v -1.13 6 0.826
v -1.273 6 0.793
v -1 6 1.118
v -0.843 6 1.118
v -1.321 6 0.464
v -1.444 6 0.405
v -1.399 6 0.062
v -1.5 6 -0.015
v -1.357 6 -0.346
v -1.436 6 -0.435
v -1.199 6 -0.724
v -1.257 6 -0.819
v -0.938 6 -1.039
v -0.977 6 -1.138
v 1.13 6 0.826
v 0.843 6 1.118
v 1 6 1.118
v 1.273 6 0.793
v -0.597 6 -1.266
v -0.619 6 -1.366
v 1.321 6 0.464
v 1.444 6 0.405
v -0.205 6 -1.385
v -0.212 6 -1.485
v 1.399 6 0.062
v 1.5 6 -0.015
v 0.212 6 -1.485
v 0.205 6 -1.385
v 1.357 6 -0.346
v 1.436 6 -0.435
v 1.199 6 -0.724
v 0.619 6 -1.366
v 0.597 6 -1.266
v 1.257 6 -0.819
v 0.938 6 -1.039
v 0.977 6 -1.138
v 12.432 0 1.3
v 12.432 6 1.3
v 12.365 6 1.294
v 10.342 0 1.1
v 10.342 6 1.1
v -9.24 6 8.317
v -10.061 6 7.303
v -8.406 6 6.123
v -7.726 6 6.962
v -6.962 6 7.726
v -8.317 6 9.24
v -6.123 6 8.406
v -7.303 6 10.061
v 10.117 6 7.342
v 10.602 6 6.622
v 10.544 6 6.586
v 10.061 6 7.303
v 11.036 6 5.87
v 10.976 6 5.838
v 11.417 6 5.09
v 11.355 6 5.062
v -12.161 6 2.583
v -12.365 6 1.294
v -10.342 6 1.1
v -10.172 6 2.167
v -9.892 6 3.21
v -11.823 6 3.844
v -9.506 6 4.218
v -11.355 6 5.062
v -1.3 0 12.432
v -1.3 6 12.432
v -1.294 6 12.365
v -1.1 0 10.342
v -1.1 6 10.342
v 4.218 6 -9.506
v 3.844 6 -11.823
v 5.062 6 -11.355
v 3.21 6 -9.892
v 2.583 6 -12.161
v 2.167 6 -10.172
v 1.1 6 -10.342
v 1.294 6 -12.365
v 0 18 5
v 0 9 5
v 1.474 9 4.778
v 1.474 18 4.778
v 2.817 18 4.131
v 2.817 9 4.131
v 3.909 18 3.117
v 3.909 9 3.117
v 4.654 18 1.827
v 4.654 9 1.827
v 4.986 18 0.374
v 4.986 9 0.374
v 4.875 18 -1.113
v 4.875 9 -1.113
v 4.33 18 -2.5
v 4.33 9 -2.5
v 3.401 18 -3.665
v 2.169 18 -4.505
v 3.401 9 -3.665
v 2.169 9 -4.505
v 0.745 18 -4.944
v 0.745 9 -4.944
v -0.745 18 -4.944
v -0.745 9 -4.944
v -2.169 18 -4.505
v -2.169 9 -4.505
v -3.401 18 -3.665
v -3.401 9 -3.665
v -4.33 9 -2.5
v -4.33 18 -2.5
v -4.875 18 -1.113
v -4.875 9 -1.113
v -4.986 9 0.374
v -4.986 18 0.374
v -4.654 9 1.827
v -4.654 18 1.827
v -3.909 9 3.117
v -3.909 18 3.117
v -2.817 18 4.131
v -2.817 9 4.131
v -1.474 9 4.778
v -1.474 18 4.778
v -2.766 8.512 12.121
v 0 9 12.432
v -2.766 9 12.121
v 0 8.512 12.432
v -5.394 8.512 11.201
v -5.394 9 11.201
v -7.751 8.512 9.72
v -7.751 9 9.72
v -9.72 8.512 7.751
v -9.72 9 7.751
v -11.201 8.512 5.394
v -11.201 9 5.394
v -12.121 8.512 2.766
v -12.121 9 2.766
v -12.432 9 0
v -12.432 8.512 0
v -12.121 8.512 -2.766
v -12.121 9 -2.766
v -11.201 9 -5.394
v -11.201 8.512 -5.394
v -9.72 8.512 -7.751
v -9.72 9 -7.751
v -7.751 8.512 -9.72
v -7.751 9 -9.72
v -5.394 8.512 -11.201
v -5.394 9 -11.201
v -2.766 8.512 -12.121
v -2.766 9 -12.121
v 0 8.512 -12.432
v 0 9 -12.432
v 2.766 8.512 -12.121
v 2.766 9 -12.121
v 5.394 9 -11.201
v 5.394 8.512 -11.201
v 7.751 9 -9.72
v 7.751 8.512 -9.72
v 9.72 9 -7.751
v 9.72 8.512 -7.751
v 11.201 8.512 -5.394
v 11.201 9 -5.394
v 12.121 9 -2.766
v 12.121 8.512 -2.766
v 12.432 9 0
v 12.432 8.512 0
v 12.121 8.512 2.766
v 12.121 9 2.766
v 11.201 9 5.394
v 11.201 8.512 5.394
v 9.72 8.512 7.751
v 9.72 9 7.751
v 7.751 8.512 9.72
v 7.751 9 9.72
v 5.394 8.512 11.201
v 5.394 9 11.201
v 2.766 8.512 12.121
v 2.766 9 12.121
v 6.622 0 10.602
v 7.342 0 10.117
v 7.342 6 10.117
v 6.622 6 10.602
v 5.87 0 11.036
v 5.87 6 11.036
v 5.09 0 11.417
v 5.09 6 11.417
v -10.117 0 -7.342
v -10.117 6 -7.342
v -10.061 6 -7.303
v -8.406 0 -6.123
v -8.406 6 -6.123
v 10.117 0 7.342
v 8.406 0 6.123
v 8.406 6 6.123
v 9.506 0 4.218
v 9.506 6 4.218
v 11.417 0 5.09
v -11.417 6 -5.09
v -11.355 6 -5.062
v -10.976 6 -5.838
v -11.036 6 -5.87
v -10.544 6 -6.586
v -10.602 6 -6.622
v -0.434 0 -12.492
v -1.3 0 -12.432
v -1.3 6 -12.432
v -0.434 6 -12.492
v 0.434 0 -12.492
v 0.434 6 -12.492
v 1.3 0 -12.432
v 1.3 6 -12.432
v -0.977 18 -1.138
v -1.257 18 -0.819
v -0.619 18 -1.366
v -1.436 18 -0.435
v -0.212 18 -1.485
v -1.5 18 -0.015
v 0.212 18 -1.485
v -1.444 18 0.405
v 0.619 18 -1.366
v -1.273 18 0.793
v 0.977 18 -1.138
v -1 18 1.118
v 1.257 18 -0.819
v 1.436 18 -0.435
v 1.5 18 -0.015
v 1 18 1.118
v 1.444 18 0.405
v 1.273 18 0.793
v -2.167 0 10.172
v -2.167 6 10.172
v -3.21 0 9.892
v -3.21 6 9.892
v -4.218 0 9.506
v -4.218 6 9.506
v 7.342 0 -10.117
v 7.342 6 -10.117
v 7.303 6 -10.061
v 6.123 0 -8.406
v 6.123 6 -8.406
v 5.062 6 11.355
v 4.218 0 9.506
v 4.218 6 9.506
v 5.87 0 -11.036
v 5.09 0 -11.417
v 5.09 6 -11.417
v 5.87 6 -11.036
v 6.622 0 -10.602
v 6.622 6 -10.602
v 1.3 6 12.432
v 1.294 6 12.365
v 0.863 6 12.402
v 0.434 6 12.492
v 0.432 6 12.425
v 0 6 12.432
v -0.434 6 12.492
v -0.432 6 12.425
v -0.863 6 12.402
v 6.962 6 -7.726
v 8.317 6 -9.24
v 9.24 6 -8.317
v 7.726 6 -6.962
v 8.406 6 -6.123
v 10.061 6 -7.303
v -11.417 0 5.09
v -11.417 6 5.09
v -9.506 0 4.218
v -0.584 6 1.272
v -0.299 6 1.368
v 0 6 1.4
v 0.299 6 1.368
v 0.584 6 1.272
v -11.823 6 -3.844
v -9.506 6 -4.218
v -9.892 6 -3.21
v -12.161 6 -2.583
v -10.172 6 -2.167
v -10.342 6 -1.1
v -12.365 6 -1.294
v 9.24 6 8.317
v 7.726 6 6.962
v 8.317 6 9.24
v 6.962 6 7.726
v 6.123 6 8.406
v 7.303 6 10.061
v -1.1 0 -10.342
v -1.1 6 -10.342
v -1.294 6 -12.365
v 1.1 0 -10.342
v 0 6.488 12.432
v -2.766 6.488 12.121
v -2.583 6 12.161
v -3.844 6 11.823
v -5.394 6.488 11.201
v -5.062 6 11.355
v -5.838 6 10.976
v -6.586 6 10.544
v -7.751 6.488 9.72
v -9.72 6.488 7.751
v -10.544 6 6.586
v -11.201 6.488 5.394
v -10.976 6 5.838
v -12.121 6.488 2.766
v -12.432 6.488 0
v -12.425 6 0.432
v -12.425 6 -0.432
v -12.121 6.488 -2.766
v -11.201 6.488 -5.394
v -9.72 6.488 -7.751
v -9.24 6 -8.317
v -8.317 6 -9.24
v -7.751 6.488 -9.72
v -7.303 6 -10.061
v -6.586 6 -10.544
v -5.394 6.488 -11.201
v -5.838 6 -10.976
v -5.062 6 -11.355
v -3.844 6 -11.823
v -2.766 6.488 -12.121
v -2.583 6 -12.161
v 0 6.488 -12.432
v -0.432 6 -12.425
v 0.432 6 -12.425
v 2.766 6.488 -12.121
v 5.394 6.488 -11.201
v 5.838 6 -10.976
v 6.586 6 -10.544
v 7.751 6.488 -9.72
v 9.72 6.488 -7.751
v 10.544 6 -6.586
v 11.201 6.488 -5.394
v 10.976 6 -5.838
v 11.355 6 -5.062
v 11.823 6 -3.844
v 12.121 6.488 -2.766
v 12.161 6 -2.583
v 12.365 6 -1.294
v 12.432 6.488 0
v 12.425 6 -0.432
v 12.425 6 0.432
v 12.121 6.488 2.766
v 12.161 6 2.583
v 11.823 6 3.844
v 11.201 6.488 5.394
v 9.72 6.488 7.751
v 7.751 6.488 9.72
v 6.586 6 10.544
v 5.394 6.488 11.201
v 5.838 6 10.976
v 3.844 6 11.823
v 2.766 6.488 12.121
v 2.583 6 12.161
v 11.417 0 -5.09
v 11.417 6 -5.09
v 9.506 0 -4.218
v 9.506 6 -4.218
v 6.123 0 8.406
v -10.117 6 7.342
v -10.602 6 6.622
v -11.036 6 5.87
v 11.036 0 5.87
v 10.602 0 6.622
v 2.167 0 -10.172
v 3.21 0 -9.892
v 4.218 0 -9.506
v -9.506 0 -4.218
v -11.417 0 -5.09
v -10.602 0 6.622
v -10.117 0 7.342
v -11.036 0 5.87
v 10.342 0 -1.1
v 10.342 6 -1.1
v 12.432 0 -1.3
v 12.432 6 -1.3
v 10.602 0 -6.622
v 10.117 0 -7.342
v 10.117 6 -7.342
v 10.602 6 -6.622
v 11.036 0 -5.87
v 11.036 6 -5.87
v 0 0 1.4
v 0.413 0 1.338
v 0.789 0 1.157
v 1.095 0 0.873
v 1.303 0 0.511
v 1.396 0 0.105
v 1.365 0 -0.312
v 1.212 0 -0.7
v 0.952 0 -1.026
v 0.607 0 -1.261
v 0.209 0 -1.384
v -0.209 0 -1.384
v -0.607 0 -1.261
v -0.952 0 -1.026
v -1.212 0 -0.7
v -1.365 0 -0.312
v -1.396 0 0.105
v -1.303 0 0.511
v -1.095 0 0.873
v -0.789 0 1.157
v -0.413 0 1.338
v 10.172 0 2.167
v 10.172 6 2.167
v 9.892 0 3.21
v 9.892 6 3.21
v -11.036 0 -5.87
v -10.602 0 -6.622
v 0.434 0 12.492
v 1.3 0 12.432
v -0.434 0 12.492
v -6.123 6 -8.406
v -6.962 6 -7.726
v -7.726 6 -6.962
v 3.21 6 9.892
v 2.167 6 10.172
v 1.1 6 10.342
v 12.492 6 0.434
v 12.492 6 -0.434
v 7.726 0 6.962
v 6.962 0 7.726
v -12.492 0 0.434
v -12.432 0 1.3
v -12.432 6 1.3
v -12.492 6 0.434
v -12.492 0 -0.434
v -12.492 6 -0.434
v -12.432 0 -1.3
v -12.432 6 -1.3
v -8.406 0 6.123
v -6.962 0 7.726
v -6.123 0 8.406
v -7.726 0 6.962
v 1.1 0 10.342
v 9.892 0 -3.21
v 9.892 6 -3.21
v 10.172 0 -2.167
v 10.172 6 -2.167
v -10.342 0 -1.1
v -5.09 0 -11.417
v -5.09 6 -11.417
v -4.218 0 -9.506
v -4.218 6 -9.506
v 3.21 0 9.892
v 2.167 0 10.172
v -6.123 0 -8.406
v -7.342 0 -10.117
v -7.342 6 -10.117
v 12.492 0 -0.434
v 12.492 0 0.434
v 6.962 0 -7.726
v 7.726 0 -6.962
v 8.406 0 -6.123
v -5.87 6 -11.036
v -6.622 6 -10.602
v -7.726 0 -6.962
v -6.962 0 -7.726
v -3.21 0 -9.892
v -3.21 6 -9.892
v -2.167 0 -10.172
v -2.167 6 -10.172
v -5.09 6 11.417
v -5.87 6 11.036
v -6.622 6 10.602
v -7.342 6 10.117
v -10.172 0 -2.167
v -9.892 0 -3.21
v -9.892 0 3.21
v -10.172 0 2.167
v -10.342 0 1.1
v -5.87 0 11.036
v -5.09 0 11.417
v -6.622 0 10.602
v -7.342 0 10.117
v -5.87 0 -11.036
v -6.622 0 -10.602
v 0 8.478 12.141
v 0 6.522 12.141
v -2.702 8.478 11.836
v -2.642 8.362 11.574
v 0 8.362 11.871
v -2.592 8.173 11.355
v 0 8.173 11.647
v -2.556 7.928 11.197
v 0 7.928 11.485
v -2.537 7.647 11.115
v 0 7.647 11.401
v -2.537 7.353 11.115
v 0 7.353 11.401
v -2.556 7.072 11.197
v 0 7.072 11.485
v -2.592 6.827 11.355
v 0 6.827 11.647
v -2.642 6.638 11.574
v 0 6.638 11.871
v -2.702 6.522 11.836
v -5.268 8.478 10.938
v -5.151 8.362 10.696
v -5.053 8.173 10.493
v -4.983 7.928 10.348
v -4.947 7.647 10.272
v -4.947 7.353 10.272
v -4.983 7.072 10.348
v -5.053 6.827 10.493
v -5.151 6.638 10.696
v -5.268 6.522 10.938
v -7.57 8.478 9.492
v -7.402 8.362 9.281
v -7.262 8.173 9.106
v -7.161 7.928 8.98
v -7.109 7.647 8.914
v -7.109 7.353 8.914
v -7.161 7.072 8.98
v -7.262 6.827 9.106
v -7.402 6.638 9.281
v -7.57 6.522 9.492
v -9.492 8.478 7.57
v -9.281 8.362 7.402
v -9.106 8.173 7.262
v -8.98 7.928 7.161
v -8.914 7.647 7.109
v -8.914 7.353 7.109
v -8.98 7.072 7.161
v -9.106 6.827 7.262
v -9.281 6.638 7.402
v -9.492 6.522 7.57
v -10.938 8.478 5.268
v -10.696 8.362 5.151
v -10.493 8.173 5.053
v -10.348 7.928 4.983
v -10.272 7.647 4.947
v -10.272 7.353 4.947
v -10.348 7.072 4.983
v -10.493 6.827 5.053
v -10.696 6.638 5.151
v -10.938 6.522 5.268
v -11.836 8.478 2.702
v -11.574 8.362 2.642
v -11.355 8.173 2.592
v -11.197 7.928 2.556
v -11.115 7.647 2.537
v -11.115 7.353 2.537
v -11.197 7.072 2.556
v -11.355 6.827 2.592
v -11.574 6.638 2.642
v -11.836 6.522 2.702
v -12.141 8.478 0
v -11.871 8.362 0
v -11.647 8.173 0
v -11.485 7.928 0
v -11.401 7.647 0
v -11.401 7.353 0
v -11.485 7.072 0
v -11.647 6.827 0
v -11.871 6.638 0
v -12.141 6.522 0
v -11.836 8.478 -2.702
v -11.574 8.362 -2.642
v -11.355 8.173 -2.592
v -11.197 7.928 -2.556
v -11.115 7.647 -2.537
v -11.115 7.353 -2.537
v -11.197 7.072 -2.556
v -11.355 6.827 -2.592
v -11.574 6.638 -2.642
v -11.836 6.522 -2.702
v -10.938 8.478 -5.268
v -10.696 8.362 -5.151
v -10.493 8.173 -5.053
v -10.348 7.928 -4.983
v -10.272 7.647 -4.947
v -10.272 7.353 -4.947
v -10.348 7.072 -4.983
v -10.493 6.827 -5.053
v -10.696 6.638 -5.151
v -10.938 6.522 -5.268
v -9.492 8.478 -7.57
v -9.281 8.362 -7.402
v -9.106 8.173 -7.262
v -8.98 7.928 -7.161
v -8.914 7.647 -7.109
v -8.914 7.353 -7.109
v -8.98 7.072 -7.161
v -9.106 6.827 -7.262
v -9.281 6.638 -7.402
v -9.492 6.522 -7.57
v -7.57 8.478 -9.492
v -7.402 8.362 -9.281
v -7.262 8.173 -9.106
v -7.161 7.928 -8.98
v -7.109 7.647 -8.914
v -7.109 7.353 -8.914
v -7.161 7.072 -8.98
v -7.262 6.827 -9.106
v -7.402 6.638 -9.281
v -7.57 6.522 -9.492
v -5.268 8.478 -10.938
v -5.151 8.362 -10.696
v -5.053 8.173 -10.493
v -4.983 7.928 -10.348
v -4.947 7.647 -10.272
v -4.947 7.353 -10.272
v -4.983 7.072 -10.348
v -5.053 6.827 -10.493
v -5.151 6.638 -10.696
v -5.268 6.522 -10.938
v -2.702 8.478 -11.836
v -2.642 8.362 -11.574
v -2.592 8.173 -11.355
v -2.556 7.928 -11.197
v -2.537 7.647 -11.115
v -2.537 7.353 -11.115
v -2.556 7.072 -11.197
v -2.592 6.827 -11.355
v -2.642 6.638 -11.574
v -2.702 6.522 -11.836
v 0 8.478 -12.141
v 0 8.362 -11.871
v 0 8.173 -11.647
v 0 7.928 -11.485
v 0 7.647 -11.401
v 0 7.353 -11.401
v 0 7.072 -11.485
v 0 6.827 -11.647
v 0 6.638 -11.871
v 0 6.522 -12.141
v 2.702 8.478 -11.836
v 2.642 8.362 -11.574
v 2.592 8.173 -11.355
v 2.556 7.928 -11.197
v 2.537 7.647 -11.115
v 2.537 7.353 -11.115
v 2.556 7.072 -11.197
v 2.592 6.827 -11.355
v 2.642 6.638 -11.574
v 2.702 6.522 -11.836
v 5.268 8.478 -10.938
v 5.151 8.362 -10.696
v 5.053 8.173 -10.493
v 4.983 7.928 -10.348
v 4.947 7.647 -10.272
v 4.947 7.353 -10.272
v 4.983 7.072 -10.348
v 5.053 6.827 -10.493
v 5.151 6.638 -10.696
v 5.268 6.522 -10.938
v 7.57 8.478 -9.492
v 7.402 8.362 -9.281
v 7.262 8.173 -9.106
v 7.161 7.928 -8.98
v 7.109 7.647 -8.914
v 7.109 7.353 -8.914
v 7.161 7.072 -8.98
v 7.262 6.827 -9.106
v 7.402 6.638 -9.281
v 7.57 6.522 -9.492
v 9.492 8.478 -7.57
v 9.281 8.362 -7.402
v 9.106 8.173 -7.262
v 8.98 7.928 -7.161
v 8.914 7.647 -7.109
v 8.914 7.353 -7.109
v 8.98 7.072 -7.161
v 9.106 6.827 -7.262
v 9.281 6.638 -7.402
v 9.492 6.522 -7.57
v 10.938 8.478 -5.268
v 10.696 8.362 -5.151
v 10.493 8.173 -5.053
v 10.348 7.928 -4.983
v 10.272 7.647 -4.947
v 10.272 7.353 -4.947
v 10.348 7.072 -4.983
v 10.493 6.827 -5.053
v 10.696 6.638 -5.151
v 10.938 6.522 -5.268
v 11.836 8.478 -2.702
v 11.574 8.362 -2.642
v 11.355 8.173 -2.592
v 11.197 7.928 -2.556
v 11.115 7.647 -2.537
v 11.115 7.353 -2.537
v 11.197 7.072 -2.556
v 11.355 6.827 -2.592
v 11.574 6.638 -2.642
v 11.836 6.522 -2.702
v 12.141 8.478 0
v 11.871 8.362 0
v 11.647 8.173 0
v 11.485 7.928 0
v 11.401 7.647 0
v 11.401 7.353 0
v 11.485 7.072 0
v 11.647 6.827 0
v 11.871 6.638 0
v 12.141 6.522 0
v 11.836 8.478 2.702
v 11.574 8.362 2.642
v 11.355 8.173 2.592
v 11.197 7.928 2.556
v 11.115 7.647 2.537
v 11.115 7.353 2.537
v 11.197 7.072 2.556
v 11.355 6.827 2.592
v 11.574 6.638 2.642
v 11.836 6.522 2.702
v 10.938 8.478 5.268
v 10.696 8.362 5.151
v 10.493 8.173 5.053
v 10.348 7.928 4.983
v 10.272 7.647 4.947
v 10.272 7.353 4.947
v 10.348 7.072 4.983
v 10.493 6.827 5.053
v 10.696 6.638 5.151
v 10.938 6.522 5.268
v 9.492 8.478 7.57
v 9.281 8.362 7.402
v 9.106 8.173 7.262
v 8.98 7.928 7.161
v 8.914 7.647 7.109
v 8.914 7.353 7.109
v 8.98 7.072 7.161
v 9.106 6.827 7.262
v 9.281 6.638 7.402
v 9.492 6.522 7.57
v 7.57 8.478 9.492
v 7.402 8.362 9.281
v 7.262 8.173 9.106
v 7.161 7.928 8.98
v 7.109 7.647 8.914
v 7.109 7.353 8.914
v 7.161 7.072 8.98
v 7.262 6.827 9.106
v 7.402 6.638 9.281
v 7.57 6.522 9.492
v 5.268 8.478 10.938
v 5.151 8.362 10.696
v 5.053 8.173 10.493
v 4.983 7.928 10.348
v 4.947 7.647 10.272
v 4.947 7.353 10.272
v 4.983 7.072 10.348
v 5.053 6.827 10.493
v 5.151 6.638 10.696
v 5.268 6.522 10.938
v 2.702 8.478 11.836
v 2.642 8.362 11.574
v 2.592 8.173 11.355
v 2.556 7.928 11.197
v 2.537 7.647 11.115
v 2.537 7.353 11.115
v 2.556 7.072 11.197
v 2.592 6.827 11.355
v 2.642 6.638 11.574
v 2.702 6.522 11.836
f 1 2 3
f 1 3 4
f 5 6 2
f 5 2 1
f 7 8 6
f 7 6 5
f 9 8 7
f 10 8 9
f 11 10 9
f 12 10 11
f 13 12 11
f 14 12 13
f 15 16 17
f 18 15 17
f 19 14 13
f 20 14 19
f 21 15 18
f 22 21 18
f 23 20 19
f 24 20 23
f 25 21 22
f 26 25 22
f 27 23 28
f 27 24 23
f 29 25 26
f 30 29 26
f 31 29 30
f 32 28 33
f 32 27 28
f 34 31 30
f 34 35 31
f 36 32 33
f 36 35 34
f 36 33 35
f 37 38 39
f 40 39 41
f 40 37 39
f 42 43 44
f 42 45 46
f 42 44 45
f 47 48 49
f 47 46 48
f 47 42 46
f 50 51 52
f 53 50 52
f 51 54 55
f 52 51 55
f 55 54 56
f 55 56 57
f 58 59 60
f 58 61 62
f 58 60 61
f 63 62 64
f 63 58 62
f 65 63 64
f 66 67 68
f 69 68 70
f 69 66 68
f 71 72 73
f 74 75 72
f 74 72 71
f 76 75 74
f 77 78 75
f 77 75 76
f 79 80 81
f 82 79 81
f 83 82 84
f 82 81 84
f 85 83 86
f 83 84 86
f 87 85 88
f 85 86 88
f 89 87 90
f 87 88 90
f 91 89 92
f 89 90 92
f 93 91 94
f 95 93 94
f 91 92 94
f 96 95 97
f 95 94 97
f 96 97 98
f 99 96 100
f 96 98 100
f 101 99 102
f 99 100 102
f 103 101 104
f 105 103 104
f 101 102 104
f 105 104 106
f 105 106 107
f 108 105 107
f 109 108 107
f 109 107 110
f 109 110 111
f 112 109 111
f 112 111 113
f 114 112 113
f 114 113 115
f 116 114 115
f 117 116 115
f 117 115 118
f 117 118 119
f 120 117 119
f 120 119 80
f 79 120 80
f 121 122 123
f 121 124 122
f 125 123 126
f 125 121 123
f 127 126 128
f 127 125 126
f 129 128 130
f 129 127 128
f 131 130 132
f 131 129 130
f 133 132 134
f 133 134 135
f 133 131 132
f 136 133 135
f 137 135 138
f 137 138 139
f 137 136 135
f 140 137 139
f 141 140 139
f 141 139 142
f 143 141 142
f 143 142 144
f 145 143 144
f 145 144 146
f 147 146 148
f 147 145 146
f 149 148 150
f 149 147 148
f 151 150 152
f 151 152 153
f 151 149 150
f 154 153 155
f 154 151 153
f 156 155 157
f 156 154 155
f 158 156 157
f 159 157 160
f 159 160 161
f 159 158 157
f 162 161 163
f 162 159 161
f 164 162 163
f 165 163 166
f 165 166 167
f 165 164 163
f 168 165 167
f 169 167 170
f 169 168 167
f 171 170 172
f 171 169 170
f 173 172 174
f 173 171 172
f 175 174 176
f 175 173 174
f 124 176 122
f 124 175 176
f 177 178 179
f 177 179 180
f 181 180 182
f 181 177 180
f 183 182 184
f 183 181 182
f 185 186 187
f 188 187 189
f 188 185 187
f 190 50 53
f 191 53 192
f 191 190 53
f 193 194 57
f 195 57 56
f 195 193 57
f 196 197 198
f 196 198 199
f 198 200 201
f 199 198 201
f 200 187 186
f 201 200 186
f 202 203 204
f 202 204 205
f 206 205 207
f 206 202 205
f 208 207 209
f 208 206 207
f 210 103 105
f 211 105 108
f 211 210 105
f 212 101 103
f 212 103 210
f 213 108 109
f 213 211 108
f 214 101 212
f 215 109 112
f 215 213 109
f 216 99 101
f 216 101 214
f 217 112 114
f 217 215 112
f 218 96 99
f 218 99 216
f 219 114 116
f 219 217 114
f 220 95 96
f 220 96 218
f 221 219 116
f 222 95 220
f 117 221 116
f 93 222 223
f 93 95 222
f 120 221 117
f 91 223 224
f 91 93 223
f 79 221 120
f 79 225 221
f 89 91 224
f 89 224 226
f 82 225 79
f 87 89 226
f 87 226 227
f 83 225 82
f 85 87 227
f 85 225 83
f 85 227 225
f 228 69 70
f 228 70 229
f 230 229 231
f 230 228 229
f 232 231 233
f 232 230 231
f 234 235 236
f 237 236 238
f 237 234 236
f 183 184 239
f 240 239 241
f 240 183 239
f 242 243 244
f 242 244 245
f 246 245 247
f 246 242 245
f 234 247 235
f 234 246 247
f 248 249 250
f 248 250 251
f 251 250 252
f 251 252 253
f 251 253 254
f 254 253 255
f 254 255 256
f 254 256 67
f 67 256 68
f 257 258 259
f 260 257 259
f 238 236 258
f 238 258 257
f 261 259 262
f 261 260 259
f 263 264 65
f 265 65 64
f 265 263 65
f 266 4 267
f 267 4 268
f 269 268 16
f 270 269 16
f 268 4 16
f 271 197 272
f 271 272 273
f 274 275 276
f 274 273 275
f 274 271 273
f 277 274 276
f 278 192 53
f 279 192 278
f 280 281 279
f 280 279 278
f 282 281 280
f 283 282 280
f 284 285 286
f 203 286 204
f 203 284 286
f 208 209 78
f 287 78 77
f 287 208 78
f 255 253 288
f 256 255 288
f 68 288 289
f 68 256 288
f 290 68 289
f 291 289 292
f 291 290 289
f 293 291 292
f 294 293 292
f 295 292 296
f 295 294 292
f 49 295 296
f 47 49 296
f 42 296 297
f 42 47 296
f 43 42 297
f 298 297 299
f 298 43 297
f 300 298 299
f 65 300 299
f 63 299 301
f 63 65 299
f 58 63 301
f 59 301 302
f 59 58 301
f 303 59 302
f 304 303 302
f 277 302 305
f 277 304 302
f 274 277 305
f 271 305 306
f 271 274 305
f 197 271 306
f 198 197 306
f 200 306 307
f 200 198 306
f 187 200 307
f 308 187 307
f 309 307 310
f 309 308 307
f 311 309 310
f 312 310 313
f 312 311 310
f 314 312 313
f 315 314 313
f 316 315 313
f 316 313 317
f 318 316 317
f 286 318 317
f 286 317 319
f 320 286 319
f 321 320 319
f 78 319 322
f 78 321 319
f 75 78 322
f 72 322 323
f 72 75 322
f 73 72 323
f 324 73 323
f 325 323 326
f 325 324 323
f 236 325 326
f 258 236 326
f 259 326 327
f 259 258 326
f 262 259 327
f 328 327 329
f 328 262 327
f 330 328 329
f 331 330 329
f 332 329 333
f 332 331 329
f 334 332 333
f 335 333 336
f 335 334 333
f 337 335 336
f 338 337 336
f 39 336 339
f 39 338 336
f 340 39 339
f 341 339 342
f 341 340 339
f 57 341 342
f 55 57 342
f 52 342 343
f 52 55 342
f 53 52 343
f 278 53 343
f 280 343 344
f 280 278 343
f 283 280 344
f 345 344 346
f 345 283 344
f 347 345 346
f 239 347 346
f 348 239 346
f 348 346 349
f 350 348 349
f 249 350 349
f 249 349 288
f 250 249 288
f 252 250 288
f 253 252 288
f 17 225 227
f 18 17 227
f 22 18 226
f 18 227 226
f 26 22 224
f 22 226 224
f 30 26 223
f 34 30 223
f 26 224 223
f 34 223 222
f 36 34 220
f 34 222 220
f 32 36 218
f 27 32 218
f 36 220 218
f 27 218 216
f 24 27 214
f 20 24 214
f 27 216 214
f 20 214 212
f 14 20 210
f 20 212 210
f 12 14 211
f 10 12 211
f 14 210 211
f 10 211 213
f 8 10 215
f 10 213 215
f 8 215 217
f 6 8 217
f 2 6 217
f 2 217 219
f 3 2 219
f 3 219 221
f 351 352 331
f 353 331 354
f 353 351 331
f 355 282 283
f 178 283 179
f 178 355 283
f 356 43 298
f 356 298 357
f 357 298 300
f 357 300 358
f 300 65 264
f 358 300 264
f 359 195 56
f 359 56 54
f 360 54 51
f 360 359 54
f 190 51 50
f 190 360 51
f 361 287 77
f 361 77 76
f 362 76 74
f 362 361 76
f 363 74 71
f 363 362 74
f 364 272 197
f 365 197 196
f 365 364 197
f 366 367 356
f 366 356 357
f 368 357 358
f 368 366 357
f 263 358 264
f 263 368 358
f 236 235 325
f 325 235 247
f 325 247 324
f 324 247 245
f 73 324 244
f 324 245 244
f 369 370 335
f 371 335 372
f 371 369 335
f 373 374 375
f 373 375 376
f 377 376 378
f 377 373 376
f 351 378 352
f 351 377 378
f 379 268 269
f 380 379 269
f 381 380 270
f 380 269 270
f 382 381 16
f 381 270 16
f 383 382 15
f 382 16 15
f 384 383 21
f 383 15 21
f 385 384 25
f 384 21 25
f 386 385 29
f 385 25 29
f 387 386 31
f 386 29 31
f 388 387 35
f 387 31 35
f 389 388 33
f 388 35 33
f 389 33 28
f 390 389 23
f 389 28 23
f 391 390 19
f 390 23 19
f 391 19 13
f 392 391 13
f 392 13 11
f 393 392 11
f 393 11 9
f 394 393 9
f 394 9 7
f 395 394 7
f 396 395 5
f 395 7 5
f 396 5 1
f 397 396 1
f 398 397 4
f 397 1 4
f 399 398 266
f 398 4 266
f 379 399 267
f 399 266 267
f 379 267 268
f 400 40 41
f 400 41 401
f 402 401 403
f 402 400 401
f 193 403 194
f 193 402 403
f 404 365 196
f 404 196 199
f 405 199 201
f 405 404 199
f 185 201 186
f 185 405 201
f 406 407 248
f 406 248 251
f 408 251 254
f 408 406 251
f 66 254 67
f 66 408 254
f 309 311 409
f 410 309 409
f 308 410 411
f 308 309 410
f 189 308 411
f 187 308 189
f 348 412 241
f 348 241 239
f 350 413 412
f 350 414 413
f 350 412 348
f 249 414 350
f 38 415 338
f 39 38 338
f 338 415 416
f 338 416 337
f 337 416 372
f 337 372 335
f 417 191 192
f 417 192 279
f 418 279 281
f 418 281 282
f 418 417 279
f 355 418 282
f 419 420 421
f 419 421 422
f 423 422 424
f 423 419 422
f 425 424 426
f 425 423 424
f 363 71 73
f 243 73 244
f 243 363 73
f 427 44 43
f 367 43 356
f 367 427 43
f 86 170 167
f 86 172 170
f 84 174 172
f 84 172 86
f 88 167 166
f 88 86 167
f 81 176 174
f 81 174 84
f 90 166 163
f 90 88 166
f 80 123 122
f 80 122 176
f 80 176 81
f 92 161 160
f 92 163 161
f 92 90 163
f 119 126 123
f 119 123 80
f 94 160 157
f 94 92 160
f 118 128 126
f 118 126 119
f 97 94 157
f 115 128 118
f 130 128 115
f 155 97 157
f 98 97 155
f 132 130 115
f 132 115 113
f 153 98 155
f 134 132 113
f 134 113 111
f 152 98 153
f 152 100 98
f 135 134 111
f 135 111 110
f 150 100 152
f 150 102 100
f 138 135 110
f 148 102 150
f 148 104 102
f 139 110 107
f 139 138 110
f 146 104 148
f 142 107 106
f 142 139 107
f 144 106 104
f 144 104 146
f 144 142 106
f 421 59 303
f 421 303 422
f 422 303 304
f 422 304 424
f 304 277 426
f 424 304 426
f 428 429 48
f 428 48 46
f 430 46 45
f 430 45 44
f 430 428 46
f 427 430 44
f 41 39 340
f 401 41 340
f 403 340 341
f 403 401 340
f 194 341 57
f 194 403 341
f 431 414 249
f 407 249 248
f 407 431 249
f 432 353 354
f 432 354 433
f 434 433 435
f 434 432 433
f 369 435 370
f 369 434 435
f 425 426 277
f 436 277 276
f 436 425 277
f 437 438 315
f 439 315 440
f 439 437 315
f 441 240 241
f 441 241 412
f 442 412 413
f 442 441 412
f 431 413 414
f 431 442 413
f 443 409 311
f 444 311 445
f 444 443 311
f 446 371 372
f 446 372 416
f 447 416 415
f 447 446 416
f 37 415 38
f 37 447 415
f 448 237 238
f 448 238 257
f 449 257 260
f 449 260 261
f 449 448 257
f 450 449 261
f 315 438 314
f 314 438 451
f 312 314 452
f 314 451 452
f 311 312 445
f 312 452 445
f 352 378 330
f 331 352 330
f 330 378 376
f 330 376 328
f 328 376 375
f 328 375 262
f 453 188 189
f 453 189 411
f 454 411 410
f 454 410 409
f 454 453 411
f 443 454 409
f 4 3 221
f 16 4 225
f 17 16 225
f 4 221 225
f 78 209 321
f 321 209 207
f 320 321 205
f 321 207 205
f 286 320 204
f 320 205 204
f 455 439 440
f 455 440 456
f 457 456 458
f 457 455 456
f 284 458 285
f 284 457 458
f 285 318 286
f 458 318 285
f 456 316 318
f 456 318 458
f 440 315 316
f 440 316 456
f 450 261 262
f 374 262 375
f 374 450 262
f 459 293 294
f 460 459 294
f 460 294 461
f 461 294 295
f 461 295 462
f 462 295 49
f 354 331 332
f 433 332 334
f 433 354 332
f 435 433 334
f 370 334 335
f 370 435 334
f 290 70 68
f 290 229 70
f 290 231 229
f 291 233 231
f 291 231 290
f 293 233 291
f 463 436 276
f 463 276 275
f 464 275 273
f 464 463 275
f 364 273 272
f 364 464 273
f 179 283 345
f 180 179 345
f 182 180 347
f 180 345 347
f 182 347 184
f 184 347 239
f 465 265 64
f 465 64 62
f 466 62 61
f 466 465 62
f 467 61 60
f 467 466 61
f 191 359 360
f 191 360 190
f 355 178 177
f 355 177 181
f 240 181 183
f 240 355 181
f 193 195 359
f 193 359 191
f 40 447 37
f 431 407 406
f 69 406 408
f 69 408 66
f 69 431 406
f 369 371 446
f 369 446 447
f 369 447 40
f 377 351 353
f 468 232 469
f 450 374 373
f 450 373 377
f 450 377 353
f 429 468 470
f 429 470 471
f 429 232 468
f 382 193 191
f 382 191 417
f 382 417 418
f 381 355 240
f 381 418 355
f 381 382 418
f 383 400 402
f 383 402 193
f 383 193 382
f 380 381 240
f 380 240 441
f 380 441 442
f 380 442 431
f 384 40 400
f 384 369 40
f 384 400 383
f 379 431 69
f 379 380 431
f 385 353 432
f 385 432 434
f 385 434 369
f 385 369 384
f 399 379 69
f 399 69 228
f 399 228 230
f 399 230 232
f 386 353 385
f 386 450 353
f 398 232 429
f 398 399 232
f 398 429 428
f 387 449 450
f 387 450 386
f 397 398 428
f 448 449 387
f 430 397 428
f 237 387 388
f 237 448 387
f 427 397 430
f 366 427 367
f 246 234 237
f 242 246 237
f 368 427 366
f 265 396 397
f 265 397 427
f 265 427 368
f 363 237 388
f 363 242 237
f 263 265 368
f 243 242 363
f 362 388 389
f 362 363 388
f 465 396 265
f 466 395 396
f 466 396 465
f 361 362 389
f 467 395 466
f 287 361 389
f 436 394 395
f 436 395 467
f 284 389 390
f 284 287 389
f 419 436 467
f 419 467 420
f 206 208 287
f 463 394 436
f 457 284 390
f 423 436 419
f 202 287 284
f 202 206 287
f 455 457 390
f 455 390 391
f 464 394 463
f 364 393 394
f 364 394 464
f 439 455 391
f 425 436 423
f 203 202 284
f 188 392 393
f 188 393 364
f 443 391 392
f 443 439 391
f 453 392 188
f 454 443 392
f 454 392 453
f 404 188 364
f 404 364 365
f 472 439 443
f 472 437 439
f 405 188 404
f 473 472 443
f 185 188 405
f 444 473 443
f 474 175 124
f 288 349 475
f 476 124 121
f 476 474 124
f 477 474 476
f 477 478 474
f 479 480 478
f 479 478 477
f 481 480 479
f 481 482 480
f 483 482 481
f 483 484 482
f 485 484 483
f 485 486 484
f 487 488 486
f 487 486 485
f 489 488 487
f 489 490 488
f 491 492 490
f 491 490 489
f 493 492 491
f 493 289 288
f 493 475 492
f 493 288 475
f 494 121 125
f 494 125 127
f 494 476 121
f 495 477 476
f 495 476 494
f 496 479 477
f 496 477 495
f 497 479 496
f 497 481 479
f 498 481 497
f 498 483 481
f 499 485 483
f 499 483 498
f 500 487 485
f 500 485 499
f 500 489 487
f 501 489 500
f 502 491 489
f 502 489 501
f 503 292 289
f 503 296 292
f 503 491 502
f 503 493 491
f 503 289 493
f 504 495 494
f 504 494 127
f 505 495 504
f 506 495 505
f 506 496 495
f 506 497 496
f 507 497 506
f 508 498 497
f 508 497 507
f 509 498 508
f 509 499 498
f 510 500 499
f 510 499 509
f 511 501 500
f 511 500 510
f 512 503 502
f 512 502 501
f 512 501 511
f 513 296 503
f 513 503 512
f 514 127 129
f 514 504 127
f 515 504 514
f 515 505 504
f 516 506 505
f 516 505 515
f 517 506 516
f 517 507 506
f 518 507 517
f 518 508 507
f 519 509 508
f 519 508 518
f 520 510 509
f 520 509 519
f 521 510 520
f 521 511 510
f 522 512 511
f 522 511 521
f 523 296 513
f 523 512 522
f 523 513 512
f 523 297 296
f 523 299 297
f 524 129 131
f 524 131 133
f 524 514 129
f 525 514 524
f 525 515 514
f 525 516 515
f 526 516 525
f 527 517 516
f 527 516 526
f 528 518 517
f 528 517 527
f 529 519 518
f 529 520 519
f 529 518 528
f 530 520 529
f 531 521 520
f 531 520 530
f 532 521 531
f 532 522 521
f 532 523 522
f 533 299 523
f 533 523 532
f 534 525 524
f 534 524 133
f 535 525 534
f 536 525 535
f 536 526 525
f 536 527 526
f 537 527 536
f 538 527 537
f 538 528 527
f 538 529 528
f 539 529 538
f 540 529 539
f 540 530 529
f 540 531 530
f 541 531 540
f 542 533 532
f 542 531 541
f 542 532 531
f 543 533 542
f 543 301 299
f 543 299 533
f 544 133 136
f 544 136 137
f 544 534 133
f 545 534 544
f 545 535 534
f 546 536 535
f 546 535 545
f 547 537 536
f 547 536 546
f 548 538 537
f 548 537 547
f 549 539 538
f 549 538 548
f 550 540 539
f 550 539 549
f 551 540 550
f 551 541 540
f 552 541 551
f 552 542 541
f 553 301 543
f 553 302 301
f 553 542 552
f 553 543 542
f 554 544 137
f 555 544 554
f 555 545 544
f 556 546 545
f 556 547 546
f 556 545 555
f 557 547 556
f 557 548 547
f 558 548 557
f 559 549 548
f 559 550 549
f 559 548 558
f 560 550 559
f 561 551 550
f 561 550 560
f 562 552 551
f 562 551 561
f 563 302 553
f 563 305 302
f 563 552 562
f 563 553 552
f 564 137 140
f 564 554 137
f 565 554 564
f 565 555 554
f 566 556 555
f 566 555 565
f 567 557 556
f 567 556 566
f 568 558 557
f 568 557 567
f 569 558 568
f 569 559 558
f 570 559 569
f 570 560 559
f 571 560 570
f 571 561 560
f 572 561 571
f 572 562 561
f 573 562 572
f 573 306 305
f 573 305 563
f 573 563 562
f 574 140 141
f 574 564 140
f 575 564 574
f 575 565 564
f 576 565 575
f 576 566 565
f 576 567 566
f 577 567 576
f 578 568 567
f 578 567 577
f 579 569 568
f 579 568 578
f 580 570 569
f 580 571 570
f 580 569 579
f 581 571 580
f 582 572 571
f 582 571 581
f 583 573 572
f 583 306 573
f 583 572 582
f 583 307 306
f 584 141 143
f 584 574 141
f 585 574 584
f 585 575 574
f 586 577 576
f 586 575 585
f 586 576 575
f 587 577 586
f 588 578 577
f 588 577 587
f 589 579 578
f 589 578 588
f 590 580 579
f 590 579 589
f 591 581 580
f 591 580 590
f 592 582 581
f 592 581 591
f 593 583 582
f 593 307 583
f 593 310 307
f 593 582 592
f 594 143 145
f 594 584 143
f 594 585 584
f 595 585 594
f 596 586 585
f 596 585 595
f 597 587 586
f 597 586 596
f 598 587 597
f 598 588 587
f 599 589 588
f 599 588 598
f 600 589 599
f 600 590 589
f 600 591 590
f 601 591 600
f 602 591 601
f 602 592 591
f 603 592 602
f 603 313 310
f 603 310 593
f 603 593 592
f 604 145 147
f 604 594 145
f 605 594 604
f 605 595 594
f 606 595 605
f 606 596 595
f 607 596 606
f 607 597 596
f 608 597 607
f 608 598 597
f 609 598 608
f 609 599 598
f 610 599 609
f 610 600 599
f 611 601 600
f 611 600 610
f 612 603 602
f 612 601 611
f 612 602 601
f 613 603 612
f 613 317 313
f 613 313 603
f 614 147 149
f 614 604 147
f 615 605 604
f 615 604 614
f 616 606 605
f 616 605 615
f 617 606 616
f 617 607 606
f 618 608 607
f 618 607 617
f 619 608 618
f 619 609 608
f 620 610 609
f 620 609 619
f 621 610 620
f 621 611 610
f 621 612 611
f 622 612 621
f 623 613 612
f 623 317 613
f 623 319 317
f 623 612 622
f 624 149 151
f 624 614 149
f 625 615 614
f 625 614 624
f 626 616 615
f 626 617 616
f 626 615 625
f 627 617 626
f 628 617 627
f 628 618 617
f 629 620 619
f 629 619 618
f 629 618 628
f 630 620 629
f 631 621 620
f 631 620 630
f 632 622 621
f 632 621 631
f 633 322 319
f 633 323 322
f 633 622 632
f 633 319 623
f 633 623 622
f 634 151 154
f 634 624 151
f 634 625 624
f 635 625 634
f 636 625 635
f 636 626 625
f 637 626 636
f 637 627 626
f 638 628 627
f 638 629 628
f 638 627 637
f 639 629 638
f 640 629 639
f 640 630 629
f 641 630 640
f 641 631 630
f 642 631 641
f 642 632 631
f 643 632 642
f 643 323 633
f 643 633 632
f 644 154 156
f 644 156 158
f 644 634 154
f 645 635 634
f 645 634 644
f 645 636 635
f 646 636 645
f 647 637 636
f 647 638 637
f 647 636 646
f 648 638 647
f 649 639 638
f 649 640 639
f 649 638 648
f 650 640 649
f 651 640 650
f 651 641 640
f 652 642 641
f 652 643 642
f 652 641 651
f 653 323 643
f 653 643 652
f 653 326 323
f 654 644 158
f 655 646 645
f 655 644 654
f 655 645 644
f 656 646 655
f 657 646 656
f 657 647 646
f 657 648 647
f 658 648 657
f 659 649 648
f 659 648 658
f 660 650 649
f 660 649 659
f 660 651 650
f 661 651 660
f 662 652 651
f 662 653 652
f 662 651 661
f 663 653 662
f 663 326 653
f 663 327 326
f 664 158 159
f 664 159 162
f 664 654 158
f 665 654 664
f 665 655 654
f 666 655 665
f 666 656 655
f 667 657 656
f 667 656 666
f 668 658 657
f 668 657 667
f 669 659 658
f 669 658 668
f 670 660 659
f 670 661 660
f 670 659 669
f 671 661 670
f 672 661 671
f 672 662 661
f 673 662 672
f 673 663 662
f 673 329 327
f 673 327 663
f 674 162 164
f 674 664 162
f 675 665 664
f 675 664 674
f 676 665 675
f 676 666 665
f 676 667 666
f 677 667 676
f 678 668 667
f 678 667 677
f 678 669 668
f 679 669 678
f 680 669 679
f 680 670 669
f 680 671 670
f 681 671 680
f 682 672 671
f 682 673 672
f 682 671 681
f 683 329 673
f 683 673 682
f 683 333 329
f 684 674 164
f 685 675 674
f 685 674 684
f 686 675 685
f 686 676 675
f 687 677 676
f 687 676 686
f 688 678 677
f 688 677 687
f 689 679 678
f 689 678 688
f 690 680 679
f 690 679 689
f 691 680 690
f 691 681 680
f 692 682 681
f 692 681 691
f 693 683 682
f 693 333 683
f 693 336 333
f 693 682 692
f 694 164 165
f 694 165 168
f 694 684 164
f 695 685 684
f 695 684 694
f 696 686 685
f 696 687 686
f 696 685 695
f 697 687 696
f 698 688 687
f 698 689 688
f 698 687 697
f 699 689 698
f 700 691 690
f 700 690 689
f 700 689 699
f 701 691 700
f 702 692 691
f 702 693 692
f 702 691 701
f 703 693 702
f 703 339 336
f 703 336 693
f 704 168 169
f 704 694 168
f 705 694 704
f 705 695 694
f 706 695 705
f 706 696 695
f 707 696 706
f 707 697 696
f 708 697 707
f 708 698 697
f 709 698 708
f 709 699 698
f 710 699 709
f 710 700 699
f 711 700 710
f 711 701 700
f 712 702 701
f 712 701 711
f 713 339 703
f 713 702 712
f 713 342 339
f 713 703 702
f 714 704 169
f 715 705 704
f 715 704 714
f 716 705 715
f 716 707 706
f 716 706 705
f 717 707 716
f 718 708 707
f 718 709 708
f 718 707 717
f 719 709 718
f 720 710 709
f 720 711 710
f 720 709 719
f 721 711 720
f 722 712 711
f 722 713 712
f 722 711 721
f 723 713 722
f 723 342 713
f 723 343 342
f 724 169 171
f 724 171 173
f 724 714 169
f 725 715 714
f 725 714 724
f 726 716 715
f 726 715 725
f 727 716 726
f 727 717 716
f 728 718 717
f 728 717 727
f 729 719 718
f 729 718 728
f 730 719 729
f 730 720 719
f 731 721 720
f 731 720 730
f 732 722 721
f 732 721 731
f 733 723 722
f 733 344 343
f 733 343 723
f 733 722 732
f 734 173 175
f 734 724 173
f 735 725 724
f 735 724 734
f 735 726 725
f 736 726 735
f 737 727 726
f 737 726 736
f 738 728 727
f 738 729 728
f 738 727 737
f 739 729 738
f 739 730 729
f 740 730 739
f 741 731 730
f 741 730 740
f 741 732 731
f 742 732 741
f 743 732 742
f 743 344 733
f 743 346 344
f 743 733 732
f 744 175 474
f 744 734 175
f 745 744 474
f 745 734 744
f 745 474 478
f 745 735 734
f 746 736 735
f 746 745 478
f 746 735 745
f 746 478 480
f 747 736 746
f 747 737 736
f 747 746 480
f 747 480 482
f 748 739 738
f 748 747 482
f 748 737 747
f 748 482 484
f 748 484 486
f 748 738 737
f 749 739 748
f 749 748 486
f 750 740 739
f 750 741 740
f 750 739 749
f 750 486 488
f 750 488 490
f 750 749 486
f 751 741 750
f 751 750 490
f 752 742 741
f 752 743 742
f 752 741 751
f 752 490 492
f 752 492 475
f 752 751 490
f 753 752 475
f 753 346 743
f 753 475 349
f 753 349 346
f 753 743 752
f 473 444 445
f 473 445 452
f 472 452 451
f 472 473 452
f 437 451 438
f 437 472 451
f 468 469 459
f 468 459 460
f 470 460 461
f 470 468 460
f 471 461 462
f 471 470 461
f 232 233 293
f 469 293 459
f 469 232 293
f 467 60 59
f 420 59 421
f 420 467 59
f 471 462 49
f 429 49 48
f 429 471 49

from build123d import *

# Parameters (mm, degrees)
EXTRUDE_1_DEPTH     = 6
SKETCH_3_R          = 1.4
CUT_EXTRUDE_1_DEPTH = 6
SKETCH_4_R          = 5
EXTRUDE_2_DEPTH     = 12
CUT_EXTRUDE_2_DEPTH = 12


with BuildPart() as part:
    # 草图2 → 凸台-拉伸1 (new body)
    with BuildSketch(Plane(origin=(0, 0, 0), x_dir=(1, 0, 0), z_dir=(0, 1, 0))):
        with BuildLine():
            Line((-1.1, 10.341663309), (-1.3, 12.432216214))
            ThreePointArc((-1.3, 12.432216214), (0, 12.5), (1.3, 12.432216214))
            Line((1.3, 12.432216214), (1.1, 10.341663309))
            ThreePointArc((1.1, 10.341663309), (2.691718069, 10.045628593), (4.21820371, 9.506143143))
            Line((4.21820371, 9.506143143), (5.090275082, 11.416615067))
            ThreePointArc((5.090275082, 11.416615067), (6.25, 10.825317547), (7.341941132, 10.116615067))
            Line((7.341941132, 10.116615067), (6.123459599, 8.406143143))
            ThreePointArc((6.123459599, 8.406143143), (7.353910524, 7.353910524), (8.406143143, 6.123459599))
            Line((8.406143143, 6.123459599), (10.116615067, 7.341941132))
            ThreePointArc((10.116615067, 7.341941132), (10.825317547, 6.25), (11.416615067, 5.090275082))
            Line((11.416615067, 5.090275082), (9.506143143, 4.21820371))
            ThreePointArc((9.506143143, 4.21820371), (10.045628593, 2.691718069), (10.341663309, 1.1))
            Line((10.341663309, 1.1), (12.432216214, 1.3))
            ThreePointArc((12.432216214, 1.3), (12.5, 0), (12.432216214, -1.3))
            Line((12.432216214, -1.3), (10.341663309, -1.1))
            ThreePointArc((10.341663309, -1.1), (10.045628593, -2.691718069), (9.506143143, -4.21820371))
            Line((9.506143143, -4.21820371), (11.416615067, -5.090275082))
            ThreePointArc((11.416615067, -5.090275082), (10.825317547, -6.25), (10.116615067, -7.341941132))
            Line((10.116615067, -7.341941132), (8.406143143, -6.123459599))
            ThreePointArc((8.406143143, -6.123459599), (7.353910524, -7.353910524), (6.123459599, -8.406143143))
            Line((6.123459599, -8.406143143), (7.341941132, -10.116615067))
            ThreePointArc((7.341941132, -10.116615067), (6.25, -10.825317547), (5.090275082, -11.416615067))
            Line((5.090275082, -11.416615067), (4.21820371, -9.506143143))
            ThreePointArc((4.21820371, -9.506143143), (2.691718069, -10.045628593), (1.1, -10.341663309))
            Line((1.1, -10.341663309), (1.3, -12.432216214))
            ThreePointArc((1.3, -12.432216214), (0, -12.5), (-1.3, -12.432216214))
            Line((-1.3, -12.432216214), (-1.1, -10.341663309))
            ThreePointArc((-1.1, -10.341663309), (-2.691718069, -10.045628593), (-4.21820371, -9.506143143))
            Line((-4.21820371, -9.506143143), (-5.090275082, -11.416615067))
            ThreePointArc((-5.090275082, -11.416615067), (-6.25, -10.825317547), (-7.341941132, -10.116615067))
            Line((-7.341941132, -10.116615067), (-6.123459599, -8.406143143))
            ThreePointArc((-6.123459599, -8.406143143), (-7.353910524, -7.353910524), (-8.406143143, -6.123459599))
            Line((-8.406143143, -6.123459599), (-10.116615067, -7.341941132))
            ThreePointArc((-10.116615067, -7.341941132), (-10.825317547, -6.25), (-11.416615067, -5.090275082))
            Line((-11.416615067, -5.090275082), (-9.506143143, -4.21820371))
            ThreePointArc((-9.506143143, -4.21820371), (-10.045628593, -2.691718069), (-10.341663309, -1.1))
            Line((-10.341663309, -1.1), (-12.432216214, -1.3))
            ThreePointArc((-12.432216214, -1.3), (-12.5, 0), (-12.432216214, 1.3))
            Line((-12.432216214, 1.3), (-10.341663309, 1.1))
            ThreePointArc((-10.341663309, 1.1), (-10.045628593, 2.691718069), (-9.506143143, 4.21820371))
            Line((-9.506143143, 4.21820371), (-11.416615067, 5.090275082))
            ThreePointArc((-11.416615067, 5.090275082), (-10.825317547, 6.25), (-10.116615067, 7.341941132))
            Line((-10.116615067, 7.341941132), (-8.406143143, 6.123459599))
            ThreePointArc((-8.406143143, 6.123459599), (-7.353910524, 7.353910524), (-6.123459599, 8.406143143))
            Line((-6.123459599, 8.406143143), (-7.341941132, 10.116615067))
            ThreePointArc((-7.341941132, 10.116615067), (-6.25, 10.825317547), (-5.090275082, 11.416615067))
            Line((-5.090275082, 11.416615067), (-4.21820371, 9.506143143))
            ThreePointArc((-4.21820371, 9.506143143), (-2.691718069, 10.045628593), (-1.1, 10.341663309))
        make_face()
    extrude(amount=EXTRUDE_1_DEPTH)

    # 草图3 → 切除-拉伸1 (cut)
    with BuildSketch(Plane(origin=(0, 6, 0), x_dir=(1, 0, 0), z_dir=(0, 1, 0))):
        with Locations(Location((0, 0, 0), (0, 0, 270))):
            Circle(SKETCH_3_R)
    extrude(amount=-CUT_EXTRUDE_1_DEPTH, mode=Mode.SUBTRACT)

    # 草图4 → 凸台-拉伸2 (add)
    with BuildSketch(Plane(origin=(0, 6, 0), x_dir=(1, 0, 0), z_dir=(0, 1, 0))):
        with Locations(Location((0, 0, 0), (0, 0, 270))):
            Circle(SKETCH_4_R)
    extrude(amount=EXTRUDE_2_DEPTH)

    # 草图5 → 切除-拉伸2 (cut)
    with BuildSketch(Plane(origin=(0, 18, 0), x_dir=(1, 0, 0), z_dir=(0, 1, 0))):
        with BuildLine():
            Line((-1, -1.118033989), (1, -1.118033989))
            ThreePointArc((1, -1.118033989), (0, 1.5), (-1, -1.118033989))
        make_face()
    extrude(amount=-CUT_EXTRUDE_2_DEPTH, mode=Mode.SUBTRACT)

    # 草图7 → 旋转1 (revolve)
    with BuildSketch(Plane(origin=(0, 0, 0), x_dir=(0, 0, -1), z_dir=(1, 0, 0)), mode=Mode.PRIVATE) as revolve_1_sk:
        with BuildLine():
            Line((5, 9), (12.432216214, 9))
            Line((12.432216214, 9), (12.432216214, 8.511911797))
            ThreePointArc((12.432216214, 8.511911797), (11.390525649, 7.5), (12.432216214, 6.488088203))
            Line((12.432216214, 6.488088203), (12.432216214, 6))
            Line((12.432216214, 6), (5, 6))
            Line((5, 6), (5, 9))
        make_face()
    revolve(revolve_1_sk.sketch.rotate(Axis((0, 19.919763073, 0), (0, -1, 0)), 180), axis=Axis((0, 19.919763073, 0), (0, -1, 0)))


solid = part.part
